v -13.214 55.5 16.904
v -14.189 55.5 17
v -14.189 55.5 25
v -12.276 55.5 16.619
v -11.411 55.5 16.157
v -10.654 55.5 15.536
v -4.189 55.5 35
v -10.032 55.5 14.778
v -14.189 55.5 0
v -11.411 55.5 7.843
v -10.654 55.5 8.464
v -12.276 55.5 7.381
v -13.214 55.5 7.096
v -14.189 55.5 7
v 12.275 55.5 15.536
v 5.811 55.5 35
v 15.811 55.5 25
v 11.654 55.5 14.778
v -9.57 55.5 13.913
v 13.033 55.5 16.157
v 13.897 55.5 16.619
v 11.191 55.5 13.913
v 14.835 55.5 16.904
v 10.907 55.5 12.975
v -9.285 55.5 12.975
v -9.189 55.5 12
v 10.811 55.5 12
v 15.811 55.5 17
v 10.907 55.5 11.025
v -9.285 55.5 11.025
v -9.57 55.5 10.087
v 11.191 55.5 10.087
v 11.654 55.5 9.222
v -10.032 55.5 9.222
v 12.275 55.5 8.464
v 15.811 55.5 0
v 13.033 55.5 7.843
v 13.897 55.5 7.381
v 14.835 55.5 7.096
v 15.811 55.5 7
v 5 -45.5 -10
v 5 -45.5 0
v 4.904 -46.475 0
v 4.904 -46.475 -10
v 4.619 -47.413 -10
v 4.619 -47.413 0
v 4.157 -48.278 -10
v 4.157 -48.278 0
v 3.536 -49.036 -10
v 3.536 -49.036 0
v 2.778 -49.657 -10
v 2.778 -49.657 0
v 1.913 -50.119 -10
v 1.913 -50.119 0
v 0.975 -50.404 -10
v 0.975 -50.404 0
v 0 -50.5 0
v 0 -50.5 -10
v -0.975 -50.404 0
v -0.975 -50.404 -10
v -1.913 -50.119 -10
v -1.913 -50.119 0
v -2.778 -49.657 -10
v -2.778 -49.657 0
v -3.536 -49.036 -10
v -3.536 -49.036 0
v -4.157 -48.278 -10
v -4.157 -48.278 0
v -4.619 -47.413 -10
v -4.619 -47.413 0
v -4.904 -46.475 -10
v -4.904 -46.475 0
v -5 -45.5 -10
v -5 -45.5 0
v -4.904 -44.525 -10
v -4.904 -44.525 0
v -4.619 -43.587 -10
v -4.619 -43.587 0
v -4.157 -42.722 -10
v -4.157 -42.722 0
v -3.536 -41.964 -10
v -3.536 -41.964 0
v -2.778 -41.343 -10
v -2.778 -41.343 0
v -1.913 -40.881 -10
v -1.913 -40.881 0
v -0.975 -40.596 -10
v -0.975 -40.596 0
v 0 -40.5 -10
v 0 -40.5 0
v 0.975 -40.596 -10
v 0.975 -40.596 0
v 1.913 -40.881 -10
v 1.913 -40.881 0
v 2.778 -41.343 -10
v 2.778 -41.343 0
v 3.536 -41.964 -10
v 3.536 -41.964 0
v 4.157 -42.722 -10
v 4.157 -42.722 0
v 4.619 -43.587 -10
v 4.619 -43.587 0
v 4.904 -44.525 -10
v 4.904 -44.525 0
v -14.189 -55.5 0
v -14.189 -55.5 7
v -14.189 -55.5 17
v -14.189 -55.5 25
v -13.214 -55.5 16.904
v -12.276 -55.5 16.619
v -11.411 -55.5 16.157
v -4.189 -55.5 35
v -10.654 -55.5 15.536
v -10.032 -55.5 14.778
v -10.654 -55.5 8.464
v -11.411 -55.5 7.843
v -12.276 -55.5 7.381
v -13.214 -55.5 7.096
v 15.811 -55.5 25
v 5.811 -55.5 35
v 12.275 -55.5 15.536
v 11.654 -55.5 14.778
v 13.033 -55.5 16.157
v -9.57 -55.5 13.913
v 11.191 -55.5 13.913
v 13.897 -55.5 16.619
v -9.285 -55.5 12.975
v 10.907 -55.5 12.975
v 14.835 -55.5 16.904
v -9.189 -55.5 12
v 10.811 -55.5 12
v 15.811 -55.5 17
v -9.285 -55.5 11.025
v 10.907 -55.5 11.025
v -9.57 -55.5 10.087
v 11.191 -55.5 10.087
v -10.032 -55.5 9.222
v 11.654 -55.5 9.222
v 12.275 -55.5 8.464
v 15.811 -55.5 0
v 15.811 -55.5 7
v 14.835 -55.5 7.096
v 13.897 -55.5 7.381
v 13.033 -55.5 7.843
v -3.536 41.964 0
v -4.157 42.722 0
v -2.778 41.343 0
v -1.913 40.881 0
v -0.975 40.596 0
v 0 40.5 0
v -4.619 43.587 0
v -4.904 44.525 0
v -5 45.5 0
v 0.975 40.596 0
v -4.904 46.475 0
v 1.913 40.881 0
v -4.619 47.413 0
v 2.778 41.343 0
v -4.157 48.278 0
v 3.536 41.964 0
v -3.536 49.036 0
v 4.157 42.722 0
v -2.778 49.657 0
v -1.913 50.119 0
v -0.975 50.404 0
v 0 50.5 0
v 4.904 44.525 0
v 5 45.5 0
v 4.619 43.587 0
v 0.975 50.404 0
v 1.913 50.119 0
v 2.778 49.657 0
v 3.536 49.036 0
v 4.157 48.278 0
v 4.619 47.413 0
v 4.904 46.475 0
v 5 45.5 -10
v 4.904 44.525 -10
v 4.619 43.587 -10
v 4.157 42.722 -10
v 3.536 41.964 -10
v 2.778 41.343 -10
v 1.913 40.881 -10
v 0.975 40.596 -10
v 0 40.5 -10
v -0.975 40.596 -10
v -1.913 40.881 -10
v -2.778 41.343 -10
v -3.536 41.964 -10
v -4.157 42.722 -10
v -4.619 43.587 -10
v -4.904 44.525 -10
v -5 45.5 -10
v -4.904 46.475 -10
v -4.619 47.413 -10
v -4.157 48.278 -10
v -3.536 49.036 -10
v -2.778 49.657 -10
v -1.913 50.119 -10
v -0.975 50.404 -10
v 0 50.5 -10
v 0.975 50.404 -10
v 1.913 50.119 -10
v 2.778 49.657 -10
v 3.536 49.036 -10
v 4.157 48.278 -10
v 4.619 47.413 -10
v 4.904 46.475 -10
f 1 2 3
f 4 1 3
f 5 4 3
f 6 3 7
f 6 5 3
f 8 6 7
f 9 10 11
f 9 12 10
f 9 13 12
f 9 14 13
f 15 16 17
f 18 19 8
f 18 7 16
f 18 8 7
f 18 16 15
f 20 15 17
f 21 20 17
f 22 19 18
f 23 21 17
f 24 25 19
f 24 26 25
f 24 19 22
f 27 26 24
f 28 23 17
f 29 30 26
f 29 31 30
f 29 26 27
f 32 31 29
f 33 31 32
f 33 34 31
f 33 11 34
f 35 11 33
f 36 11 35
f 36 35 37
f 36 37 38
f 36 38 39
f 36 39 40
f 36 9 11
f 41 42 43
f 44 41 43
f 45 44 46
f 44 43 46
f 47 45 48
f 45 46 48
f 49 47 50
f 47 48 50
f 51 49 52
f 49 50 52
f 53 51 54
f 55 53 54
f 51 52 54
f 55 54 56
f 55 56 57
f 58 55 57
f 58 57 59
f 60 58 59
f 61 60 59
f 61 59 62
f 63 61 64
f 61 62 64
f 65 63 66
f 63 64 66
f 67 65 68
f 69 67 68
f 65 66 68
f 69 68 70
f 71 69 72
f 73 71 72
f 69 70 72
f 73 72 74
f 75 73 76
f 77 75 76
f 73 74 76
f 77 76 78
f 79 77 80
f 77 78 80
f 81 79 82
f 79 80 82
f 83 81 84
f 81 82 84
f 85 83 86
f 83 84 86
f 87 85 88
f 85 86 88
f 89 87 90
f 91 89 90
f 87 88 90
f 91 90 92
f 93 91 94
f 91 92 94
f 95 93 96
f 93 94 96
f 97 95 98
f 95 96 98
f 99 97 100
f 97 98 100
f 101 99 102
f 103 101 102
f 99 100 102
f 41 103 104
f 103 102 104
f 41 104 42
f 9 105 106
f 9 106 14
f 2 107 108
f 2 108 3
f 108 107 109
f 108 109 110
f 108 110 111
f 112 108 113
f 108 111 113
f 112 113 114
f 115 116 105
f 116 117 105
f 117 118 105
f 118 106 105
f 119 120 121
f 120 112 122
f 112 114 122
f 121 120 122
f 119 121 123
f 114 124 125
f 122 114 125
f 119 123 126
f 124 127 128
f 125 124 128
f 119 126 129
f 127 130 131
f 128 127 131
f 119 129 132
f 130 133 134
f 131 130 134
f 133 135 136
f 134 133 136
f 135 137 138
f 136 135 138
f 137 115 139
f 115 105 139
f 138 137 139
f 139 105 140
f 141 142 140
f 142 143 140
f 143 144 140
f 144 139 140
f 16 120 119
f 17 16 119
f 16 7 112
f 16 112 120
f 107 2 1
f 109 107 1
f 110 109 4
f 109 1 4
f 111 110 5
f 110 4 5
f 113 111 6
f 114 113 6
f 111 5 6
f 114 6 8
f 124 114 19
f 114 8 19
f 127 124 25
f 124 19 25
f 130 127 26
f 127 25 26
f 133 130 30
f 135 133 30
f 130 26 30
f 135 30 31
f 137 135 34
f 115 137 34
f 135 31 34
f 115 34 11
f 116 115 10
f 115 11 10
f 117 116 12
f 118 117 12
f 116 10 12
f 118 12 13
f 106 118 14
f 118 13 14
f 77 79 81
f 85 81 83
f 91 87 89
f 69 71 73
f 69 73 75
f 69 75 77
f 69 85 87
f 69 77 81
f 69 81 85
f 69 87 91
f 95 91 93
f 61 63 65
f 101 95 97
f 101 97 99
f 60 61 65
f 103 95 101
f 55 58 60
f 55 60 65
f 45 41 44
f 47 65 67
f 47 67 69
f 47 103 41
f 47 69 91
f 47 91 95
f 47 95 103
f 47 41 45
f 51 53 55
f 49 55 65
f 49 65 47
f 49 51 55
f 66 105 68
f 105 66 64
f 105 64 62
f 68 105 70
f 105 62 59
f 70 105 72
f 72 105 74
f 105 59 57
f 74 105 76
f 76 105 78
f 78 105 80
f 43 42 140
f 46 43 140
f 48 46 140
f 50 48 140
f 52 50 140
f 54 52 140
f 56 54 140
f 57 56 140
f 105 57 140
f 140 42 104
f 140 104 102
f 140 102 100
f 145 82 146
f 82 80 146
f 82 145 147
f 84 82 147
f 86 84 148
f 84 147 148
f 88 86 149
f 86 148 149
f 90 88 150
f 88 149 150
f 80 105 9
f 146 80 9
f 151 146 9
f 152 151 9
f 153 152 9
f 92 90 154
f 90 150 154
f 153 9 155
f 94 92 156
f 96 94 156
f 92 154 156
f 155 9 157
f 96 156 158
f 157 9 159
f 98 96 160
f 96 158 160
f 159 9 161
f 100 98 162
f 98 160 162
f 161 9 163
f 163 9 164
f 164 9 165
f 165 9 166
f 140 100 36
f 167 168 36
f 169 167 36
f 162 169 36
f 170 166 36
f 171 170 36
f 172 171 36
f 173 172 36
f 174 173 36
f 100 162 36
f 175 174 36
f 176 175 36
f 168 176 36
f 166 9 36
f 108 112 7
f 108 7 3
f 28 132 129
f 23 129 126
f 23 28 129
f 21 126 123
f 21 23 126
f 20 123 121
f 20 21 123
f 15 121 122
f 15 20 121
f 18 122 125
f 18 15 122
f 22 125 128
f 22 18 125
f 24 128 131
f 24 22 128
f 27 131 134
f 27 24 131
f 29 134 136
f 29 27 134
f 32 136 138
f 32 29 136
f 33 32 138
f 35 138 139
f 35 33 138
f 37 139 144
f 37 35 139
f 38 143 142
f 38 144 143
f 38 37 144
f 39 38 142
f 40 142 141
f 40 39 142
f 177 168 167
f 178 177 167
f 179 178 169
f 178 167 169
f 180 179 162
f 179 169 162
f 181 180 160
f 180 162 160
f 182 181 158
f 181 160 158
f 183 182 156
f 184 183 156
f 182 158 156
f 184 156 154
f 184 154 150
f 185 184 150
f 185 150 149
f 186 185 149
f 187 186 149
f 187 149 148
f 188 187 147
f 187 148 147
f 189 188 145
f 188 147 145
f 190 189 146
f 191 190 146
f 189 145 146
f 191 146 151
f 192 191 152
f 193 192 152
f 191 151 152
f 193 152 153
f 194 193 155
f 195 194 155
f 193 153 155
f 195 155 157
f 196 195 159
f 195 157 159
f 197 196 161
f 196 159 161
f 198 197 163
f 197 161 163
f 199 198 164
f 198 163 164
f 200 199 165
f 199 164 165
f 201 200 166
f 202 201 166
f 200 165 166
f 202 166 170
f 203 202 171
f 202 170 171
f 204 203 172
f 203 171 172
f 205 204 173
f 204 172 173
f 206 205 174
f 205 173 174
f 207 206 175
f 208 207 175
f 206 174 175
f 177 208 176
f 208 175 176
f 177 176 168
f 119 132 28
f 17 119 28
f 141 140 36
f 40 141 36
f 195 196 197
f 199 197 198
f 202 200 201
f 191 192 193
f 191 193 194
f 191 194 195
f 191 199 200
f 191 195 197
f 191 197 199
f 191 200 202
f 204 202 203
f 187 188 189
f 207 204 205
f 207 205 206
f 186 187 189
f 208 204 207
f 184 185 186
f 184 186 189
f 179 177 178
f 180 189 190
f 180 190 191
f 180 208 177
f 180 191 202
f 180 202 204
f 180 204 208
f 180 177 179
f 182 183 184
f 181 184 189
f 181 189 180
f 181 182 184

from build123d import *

# Parameters (mm, degrees)
SKETCH1_W           = 30
SKETCH1_H           = 111
BOSS_EXTRUDE1_DEPTH = 35
CUT_EXTRUDE1_DEPTH  = 118.456302638
SKETCH3_R           = 5
BOSS_EXTRUDE2_DEPTH = 10


with BuildPart() as part:
    # Sketch1 → Boss-Extrude1 (new body)
    with BuildSketch(Plane.XY):
        with Locations((0.810851631, 0)):
            Rectangle(SKETCH1_W, SKETCH1_H)
    extrude(amount=BOSS_EXTRUDE1_DEPTH)

    # Sketch2 → Cut-Extrude1 (cut, through all)
    with BuildSketch(Plane(origin=(0, 55.5, 0), x_dir=(1, 0, 0), z_dir=(0, 1, 0))):
        Polygon((5.810851631, -35), (15.810851631, -25), (15.810851631, -35), align=None)
        with BuildLine():
            Line((15.810851631, -7), (15.810851631, -17))
            ThreePointArc((15.810851631, -17), (10.810851631, -12), (15.810851631, -7))
        make_face()
        Polygon((-14.189148369, -25), (-14.189148369, -35), (-4.189148369, -35), align=None)
        with BuildLine():
            Line((-14.189148369, -7), (-14.189148369, -17))
            ThreePointArc((-14.189148369, -17), (-9.189148369, -12), (-14.189148369, -7))
        make_face()
    extrude(amount=-CUT_EXTRUDE1_DEPTH, mode=Mode.SUBTRACT)

    # Sketch3 → Boss-Extrude2 (add)
    with BuildSketch(Plane(origin=(0, 0, 0), x_dir=(-1, 0, 0), z_dir=(0, 0, -1))):
        with Locations(Location((0, 45.5, 0), (0, 0, 180))):
            Circle(SKETCH3_R)
        with Locations(Location((0, -45.5, 0), (0, 0, 180))):
            Circle(SKETCH3_R)
    extrude(amount=BOSS_EXTRUDE2_DEPTH)


solid = part.part
